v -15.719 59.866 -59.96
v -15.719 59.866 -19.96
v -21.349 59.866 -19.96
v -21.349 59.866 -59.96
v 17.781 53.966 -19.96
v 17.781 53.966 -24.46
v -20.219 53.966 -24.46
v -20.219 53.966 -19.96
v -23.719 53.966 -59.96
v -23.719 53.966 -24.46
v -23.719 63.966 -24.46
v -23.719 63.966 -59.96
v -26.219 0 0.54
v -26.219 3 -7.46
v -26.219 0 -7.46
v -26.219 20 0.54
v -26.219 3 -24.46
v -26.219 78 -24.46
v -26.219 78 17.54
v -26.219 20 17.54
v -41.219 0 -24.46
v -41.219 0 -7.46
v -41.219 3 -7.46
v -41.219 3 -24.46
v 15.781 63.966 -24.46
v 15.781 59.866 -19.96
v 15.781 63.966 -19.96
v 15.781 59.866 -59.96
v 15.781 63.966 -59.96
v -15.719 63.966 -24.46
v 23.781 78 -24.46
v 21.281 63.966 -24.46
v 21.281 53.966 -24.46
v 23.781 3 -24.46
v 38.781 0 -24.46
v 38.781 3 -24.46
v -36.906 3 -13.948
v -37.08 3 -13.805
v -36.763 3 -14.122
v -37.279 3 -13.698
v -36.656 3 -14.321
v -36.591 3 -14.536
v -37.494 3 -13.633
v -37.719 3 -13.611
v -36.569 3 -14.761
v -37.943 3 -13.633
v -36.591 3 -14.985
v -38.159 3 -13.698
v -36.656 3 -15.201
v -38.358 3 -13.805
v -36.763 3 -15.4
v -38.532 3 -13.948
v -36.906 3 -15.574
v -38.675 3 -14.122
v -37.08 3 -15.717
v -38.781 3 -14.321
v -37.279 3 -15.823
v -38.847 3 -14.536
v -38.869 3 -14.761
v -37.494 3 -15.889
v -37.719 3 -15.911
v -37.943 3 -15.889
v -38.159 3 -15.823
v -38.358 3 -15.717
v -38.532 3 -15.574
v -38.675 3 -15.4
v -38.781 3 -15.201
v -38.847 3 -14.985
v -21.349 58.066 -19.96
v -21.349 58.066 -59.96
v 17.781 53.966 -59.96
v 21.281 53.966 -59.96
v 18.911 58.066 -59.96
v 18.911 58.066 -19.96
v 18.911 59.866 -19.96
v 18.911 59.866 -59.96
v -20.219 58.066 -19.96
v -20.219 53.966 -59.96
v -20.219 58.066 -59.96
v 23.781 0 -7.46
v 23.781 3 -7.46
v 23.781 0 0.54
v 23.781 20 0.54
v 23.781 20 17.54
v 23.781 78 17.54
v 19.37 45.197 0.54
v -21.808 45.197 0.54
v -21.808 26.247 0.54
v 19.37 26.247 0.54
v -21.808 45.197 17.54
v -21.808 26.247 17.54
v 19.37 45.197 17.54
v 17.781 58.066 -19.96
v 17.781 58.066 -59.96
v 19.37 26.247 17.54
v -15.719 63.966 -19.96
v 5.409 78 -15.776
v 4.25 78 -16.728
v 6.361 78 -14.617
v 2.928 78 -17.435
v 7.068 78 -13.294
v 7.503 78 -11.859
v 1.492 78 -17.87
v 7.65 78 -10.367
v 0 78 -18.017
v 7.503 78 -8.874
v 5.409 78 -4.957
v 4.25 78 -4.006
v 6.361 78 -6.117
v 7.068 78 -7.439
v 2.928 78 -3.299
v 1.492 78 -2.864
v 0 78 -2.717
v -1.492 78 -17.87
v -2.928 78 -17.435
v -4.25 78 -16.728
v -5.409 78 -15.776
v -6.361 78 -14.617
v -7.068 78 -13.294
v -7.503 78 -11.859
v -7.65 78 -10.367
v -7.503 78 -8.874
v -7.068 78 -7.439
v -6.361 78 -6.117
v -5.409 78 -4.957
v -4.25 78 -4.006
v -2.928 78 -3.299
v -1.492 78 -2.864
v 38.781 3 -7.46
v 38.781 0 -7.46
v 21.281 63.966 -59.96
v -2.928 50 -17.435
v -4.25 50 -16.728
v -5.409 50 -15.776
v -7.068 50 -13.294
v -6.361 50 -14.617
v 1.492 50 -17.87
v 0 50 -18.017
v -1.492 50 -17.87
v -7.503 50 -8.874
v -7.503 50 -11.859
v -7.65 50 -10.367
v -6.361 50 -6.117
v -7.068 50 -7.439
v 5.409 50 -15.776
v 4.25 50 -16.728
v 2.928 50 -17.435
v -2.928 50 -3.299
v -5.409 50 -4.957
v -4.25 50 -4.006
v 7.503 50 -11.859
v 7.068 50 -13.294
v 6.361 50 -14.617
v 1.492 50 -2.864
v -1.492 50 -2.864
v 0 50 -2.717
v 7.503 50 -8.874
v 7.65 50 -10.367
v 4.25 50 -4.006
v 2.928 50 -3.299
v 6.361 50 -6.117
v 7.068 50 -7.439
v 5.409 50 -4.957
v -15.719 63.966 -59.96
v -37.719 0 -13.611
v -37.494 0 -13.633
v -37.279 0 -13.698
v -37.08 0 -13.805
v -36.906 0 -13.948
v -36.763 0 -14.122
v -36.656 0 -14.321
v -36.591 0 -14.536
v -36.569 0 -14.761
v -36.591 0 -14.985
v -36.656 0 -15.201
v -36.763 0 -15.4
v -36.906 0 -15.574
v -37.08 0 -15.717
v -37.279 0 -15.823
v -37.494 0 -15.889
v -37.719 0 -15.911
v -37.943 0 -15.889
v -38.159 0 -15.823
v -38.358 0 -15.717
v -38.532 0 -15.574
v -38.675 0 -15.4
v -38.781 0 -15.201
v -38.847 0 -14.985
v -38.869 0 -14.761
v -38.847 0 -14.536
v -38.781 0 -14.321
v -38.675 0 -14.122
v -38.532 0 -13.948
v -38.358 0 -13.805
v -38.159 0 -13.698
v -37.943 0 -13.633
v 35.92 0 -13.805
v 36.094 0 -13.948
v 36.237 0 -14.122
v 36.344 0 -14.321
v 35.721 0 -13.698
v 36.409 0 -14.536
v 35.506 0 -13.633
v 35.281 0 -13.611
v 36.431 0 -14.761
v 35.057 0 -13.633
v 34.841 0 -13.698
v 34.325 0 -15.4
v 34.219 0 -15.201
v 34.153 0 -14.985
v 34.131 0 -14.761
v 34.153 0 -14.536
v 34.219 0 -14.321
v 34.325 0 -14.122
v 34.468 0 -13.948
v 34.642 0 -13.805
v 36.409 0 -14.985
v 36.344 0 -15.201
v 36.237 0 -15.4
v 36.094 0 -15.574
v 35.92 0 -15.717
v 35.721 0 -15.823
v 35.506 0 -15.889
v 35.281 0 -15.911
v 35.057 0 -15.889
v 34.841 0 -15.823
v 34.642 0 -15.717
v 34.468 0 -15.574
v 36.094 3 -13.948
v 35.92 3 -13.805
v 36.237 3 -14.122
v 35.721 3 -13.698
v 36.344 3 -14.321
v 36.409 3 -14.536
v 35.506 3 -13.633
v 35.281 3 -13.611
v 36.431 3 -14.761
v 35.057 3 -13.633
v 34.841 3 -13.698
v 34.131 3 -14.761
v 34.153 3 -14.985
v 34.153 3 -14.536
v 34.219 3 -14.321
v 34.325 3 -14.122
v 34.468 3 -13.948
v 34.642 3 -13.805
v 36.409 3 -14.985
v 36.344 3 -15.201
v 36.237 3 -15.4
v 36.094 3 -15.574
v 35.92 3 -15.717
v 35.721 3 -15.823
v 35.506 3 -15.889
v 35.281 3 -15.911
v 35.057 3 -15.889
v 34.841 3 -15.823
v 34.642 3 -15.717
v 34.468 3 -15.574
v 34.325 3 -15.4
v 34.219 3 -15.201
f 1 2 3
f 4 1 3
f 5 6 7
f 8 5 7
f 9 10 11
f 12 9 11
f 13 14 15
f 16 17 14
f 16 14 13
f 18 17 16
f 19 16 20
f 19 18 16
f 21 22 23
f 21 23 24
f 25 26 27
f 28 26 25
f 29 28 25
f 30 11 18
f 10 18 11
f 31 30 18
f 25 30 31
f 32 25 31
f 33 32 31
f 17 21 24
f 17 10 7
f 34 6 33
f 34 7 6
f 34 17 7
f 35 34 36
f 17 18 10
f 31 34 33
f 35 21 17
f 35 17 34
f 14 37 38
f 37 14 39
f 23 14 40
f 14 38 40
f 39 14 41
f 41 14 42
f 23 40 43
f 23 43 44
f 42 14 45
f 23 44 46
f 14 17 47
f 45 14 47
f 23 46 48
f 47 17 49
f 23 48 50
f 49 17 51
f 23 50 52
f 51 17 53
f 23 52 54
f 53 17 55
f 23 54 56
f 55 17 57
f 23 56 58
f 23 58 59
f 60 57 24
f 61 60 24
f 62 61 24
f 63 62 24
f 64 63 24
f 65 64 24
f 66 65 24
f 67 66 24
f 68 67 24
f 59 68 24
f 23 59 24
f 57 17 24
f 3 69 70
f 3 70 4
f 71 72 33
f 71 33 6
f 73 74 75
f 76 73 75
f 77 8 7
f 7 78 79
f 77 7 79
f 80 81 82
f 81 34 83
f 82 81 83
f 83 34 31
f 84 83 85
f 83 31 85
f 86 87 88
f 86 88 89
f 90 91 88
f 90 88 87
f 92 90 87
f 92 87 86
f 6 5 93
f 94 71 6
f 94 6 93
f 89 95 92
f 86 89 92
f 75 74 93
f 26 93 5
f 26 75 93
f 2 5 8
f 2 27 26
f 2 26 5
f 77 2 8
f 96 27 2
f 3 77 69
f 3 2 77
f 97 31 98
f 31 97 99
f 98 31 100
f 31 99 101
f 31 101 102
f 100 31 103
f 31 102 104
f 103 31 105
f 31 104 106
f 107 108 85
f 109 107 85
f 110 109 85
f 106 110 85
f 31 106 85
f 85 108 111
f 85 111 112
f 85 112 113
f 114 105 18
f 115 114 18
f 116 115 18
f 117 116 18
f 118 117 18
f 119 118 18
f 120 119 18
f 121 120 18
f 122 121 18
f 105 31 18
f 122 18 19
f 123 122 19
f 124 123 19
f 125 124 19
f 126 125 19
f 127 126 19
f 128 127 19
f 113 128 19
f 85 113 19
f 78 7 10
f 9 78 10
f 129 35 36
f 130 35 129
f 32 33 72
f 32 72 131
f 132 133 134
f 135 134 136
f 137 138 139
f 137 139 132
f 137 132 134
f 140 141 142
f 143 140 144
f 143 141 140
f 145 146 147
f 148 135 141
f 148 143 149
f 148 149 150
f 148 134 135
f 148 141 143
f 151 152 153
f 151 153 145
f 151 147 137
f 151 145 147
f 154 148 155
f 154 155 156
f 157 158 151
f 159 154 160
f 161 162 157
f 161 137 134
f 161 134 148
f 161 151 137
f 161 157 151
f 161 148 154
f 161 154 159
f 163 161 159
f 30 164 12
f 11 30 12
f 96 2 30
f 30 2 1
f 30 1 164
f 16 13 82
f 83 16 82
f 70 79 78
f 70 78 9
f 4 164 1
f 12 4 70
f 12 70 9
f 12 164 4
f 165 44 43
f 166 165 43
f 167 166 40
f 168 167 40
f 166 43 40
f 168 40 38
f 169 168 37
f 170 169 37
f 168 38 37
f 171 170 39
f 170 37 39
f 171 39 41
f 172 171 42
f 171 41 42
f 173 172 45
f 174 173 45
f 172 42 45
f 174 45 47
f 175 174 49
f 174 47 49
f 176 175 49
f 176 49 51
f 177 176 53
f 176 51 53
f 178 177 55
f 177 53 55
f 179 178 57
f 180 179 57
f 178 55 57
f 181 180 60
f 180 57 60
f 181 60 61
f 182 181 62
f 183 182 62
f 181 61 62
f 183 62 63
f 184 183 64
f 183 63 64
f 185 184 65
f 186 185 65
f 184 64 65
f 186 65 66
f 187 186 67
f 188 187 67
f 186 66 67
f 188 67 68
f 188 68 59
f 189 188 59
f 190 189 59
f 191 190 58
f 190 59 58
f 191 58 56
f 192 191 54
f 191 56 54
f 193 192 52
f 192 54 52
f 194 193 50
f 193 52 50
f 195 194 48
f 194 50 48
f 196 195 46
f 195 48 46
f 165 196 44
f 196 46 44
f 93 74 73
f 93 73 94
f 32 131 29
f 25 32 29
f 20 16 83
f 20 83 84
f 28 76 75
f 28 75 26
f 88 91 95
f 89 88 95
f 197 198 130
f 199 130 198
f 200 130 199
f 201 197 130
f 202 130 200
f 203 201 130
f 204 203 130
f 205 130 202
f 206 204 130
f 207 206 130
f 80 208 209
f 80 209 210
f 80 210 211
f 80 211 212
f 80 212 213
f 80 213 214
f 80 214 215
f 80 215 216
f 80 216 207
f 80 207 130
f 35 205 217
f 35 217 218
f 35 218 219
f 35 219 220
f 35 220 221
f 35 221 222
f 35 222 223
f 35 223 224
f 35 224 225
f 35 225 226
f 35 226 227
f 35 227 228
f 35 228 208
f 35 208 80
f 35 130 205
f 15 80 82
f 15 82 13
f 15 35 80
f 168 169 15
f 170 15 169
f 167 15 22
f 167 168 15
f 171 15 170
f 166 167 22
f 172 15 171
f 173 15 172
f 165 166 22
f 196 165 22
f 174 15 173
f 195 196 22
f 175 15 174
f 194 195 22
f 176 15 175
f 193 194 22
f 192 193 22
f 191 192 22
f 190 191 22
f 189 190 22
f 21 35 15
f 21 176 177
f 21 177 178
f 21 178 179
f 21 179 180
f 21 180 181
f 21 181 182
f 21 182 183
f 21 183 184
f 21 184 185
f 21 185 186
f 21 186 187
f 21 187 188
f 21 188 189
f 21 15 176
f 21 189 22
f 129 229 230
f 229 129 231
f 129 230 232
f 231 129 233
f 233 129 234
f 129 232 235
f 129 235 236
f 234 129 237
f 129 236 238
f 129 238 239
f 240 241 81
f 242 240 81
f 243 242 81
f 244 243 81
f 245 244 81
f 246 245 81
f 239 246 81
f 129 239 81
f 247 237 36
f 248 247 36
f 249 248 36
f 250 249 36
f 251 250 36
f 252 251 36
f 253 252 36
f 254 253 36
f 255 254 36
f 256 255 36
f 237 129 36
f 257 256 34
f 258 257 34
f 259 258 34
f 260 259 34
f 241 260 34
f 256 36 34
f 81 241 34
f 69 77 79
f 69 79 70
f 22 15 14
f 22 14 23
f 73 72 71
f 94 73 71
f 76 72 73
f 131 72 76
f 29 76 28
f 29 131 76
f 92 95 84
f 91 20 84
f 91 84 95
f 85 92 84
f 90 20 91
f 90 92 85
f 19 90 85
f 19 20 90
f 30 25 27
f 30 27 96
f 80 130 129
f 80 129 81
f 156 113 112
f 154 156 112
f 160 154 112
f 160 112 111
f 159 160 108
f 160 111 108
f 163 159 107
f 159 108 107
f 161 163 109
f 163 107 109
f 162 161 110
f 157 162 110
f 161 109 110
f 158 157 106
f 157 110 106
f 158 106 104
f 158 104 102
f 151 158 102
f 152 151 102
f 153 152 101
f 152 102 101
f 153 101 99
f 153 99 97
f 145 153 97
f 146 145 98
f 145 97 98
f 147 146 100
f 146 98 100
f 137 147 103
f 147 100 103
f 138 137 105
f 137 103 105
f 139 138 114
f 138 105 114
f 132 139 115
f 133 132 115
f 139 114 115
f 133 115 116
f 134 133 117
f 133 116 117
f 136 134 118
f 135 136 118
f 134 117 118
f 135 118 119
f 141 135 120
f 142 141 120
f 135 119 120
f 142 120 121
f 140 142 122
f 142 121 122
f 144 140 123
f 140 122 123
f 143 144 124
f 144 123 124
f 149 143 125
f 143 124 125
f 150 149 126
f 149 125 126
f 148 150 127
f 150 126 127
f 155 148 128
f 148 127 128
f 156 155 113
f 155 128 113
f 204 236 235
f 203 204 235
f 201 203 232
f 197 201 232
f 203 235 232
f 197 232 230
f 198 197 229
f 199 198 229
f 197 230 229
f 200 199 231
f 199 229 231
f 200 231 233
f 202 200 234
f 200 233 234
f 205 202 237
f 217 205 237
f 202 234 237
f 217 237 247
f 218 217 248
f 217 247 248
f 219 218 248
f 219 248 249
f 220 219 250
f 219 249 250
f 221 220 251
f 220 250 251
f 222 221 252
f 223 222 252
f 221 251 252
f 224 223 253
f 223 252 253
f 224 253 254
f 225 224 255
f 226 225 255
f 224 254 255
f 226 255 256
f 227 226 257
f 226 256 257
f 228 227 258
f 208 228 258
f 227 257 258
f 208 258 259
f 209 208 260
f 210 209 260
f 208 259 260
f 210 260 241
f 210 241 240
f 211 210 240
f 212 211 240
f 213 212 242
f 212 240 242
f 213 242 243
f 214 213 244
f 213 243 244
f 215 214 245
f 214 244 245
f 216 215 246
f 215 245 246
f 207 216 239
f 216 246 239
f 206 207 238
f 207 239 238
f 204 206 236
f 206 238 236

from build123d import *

# Parameters (mm, degrees)
OG_BASE_DEPTH       = 3
SKETCH5_R           = 1.15
CUT_EXTRUDE1_DEPTH  = 3
SKETCH6_W           = 50
SKETCH6_H           = 25
BOSS_EXTRUDE3_DEPTH = 75
SKETCH8_W           = 17
SKETCH8_H           = 58
BOSS_EXTRUDE4_DEPTH = 50
SKETCH10_W          = 45
SKETCH10_H          = 10
BOSS_EXTRUDE5_DEPTH = 35.5
SKETCH11_W          = 40.26
SKETCH11_H          = 1.8
CUT_EXTRUDE2_DEPTH  = 40
SKETCH13_W          = 38
SKETCH13_H          = 4.1
CUT_EXTRUDE3_DEPTH  = 40
SKETCH14_W          = 31.5
SKETCH14_H          = 4.1
CUT_EXTRUDE4_DEPTH  = 40
SKETCH19_R          = 7.65
CUT_EXTRUDE6_DEPTH  = 28
SKETCH21_W          = 41.177647426
SKETCH21_H          = 18.949912373
CUT_EXTRUDE7_DEPTH  = 17


with BuildPart() as part:
    # Sketch3 → OG base (new body)
    with BuildSketch(Plane(origin=(0, 0, 0), x_dir=(1, 0, 0), z_dir=(0, 1, 0))):
        Polygon((-41.21875, 24.460069444), (38.78125, 24.460069444), (38.78125, 7.460069444), (23.78125, 7.460069444), (23.78125, -0.539930556), (-26.21875, -0.539930556), (-26.21875, 7.460069444), (-41.21875, 7.460069444), align=None)
    extrude(amount=OG_BASE_DEPTH)

    # Sketch5 → Cut-Extrude1 (cut)
    with BuildSketch(Plane(origin=(0, 3, 0), x_dir=(1, 0, 0), z_dir=(0, 1, 0))):
        with Locations(Location((-37.71875, 14.760831394, 0), (0, 0, 270))):
            Circle(SKETCH5_R)
        with Locations(Location((35.28125, 14.760831394, 0), (0, 0, 270))):
            Circle(SKETCH5_R)
    extrude(amount=-CUT_EXTRUDE1_DEPTH, mode=Mode.SUBTRACT)

    # Sketch6 → Boss-Extrude3 (add)
    with BuildSketch(Plane(origin=(0, 3, 0), x_dir=(1, 0, 0), z_dir=(0, 1, 0))):
        with Locations((-1.21875, 11.960069444)):
            Rectangle(SKETCH6_W, SKETCH6_H)
    extrude(amount=BOSS_EXTRUDE3_DEPTH)

    # Sketch8 → Boss-Extrude4 (add)
    with BuildSketch(Plane.ZY.offset(26.21875)):
        with Locations((9.039930556, 49)):
            Rectangle(SKETCH8_W, SKETCH8_H)
    extrude(amount=-BOSS_EXTRUDE4_DEPTH)

    # Sketch10 → Boss-Extrude5 (add)
    with BuildSketch(Plane(origin=(0, 0, -24.460069444), x_dir=(-1, 0, 0), z_dir=(0, 0, -1))):
        with Locations((1.21875, 58.965562055)):
            Rectangle(SKETCH10_W, SKETCH10_H)
    extrude(amount=BOSS_EXTRUDE5_DEPTH)

    # Sketch11 → Cut-Extrude2 (cut)
    with BuildSketch(Plane(origin=(0, 0, -59.960069444), x_dir=(-1, 0, 0), z_dir=(0, 0, -1))):
        with Locations((1.21875, 58.965562055)):
            Rectangle(SKETCH11_W, SKETCH11_H)
    extrude(amount=-CUT_EXTRUDE2_DEPTH, mode=Mode.SUBTRACT)

    # Sketch13 → Cut-Extrude3 (cut)
    with BuildSketch(Plane(origin=(0, 0, -59.960069444), x_dir=(-1, 0, 0), z_dir=(0, 0, -1))):
        with Locations((1.21875, 56.015562055)):
            Rectangle(SKETCH13_W, SKETCH13_H)
    extrude(amount=-CUT_EXTRUDE3_DEPTH, mode=Mode.SUBTRACT)

    # Sketch14 → Cut-Extrude4 (cut)
    with BuildSketch(Plane(origin=(0, 0, -59.960069444), x_dir=(-1, 0, 0), z_dir=(0, 0, -1))):
        with Locations((-0.03125, 61.915562055)):
            Rectangle(SKETCH14_W, SKETCH14_H)
    extrude(amount=-CUT_EXTRUDE4_DEPTH, mode=Mode.SUBTRACT)

    # Sketch19 → Cut-Extrude6 (cut)
    with BuildSketch(Plane(origin=(0, 78, 0), x_dir=(1, 0, 0), z_dir=(0, 1, 0))):
        with Locations(Location((0, 10.366835576, 0), (0, 0, 270))):
            Circle(SKETCH19_R)
    extrude(amount=-CUT_EXTRUDE6_DEPTH, mode=Mode.SUBTRACT)

    # Sketch21 → Cut-Extrude7 (cut)
    with BuildSketch(Plane.XY.offset(17.539930556)):
        with Locations((-1.21875, 35.722177319)):
            Rectangle(SKETCH21_W, SKETCH21_H)
    extrude(amount=-CUT_EXTRUDE7_DEPTH, mode=Mode.SUBTRACT)


solid = part.part
